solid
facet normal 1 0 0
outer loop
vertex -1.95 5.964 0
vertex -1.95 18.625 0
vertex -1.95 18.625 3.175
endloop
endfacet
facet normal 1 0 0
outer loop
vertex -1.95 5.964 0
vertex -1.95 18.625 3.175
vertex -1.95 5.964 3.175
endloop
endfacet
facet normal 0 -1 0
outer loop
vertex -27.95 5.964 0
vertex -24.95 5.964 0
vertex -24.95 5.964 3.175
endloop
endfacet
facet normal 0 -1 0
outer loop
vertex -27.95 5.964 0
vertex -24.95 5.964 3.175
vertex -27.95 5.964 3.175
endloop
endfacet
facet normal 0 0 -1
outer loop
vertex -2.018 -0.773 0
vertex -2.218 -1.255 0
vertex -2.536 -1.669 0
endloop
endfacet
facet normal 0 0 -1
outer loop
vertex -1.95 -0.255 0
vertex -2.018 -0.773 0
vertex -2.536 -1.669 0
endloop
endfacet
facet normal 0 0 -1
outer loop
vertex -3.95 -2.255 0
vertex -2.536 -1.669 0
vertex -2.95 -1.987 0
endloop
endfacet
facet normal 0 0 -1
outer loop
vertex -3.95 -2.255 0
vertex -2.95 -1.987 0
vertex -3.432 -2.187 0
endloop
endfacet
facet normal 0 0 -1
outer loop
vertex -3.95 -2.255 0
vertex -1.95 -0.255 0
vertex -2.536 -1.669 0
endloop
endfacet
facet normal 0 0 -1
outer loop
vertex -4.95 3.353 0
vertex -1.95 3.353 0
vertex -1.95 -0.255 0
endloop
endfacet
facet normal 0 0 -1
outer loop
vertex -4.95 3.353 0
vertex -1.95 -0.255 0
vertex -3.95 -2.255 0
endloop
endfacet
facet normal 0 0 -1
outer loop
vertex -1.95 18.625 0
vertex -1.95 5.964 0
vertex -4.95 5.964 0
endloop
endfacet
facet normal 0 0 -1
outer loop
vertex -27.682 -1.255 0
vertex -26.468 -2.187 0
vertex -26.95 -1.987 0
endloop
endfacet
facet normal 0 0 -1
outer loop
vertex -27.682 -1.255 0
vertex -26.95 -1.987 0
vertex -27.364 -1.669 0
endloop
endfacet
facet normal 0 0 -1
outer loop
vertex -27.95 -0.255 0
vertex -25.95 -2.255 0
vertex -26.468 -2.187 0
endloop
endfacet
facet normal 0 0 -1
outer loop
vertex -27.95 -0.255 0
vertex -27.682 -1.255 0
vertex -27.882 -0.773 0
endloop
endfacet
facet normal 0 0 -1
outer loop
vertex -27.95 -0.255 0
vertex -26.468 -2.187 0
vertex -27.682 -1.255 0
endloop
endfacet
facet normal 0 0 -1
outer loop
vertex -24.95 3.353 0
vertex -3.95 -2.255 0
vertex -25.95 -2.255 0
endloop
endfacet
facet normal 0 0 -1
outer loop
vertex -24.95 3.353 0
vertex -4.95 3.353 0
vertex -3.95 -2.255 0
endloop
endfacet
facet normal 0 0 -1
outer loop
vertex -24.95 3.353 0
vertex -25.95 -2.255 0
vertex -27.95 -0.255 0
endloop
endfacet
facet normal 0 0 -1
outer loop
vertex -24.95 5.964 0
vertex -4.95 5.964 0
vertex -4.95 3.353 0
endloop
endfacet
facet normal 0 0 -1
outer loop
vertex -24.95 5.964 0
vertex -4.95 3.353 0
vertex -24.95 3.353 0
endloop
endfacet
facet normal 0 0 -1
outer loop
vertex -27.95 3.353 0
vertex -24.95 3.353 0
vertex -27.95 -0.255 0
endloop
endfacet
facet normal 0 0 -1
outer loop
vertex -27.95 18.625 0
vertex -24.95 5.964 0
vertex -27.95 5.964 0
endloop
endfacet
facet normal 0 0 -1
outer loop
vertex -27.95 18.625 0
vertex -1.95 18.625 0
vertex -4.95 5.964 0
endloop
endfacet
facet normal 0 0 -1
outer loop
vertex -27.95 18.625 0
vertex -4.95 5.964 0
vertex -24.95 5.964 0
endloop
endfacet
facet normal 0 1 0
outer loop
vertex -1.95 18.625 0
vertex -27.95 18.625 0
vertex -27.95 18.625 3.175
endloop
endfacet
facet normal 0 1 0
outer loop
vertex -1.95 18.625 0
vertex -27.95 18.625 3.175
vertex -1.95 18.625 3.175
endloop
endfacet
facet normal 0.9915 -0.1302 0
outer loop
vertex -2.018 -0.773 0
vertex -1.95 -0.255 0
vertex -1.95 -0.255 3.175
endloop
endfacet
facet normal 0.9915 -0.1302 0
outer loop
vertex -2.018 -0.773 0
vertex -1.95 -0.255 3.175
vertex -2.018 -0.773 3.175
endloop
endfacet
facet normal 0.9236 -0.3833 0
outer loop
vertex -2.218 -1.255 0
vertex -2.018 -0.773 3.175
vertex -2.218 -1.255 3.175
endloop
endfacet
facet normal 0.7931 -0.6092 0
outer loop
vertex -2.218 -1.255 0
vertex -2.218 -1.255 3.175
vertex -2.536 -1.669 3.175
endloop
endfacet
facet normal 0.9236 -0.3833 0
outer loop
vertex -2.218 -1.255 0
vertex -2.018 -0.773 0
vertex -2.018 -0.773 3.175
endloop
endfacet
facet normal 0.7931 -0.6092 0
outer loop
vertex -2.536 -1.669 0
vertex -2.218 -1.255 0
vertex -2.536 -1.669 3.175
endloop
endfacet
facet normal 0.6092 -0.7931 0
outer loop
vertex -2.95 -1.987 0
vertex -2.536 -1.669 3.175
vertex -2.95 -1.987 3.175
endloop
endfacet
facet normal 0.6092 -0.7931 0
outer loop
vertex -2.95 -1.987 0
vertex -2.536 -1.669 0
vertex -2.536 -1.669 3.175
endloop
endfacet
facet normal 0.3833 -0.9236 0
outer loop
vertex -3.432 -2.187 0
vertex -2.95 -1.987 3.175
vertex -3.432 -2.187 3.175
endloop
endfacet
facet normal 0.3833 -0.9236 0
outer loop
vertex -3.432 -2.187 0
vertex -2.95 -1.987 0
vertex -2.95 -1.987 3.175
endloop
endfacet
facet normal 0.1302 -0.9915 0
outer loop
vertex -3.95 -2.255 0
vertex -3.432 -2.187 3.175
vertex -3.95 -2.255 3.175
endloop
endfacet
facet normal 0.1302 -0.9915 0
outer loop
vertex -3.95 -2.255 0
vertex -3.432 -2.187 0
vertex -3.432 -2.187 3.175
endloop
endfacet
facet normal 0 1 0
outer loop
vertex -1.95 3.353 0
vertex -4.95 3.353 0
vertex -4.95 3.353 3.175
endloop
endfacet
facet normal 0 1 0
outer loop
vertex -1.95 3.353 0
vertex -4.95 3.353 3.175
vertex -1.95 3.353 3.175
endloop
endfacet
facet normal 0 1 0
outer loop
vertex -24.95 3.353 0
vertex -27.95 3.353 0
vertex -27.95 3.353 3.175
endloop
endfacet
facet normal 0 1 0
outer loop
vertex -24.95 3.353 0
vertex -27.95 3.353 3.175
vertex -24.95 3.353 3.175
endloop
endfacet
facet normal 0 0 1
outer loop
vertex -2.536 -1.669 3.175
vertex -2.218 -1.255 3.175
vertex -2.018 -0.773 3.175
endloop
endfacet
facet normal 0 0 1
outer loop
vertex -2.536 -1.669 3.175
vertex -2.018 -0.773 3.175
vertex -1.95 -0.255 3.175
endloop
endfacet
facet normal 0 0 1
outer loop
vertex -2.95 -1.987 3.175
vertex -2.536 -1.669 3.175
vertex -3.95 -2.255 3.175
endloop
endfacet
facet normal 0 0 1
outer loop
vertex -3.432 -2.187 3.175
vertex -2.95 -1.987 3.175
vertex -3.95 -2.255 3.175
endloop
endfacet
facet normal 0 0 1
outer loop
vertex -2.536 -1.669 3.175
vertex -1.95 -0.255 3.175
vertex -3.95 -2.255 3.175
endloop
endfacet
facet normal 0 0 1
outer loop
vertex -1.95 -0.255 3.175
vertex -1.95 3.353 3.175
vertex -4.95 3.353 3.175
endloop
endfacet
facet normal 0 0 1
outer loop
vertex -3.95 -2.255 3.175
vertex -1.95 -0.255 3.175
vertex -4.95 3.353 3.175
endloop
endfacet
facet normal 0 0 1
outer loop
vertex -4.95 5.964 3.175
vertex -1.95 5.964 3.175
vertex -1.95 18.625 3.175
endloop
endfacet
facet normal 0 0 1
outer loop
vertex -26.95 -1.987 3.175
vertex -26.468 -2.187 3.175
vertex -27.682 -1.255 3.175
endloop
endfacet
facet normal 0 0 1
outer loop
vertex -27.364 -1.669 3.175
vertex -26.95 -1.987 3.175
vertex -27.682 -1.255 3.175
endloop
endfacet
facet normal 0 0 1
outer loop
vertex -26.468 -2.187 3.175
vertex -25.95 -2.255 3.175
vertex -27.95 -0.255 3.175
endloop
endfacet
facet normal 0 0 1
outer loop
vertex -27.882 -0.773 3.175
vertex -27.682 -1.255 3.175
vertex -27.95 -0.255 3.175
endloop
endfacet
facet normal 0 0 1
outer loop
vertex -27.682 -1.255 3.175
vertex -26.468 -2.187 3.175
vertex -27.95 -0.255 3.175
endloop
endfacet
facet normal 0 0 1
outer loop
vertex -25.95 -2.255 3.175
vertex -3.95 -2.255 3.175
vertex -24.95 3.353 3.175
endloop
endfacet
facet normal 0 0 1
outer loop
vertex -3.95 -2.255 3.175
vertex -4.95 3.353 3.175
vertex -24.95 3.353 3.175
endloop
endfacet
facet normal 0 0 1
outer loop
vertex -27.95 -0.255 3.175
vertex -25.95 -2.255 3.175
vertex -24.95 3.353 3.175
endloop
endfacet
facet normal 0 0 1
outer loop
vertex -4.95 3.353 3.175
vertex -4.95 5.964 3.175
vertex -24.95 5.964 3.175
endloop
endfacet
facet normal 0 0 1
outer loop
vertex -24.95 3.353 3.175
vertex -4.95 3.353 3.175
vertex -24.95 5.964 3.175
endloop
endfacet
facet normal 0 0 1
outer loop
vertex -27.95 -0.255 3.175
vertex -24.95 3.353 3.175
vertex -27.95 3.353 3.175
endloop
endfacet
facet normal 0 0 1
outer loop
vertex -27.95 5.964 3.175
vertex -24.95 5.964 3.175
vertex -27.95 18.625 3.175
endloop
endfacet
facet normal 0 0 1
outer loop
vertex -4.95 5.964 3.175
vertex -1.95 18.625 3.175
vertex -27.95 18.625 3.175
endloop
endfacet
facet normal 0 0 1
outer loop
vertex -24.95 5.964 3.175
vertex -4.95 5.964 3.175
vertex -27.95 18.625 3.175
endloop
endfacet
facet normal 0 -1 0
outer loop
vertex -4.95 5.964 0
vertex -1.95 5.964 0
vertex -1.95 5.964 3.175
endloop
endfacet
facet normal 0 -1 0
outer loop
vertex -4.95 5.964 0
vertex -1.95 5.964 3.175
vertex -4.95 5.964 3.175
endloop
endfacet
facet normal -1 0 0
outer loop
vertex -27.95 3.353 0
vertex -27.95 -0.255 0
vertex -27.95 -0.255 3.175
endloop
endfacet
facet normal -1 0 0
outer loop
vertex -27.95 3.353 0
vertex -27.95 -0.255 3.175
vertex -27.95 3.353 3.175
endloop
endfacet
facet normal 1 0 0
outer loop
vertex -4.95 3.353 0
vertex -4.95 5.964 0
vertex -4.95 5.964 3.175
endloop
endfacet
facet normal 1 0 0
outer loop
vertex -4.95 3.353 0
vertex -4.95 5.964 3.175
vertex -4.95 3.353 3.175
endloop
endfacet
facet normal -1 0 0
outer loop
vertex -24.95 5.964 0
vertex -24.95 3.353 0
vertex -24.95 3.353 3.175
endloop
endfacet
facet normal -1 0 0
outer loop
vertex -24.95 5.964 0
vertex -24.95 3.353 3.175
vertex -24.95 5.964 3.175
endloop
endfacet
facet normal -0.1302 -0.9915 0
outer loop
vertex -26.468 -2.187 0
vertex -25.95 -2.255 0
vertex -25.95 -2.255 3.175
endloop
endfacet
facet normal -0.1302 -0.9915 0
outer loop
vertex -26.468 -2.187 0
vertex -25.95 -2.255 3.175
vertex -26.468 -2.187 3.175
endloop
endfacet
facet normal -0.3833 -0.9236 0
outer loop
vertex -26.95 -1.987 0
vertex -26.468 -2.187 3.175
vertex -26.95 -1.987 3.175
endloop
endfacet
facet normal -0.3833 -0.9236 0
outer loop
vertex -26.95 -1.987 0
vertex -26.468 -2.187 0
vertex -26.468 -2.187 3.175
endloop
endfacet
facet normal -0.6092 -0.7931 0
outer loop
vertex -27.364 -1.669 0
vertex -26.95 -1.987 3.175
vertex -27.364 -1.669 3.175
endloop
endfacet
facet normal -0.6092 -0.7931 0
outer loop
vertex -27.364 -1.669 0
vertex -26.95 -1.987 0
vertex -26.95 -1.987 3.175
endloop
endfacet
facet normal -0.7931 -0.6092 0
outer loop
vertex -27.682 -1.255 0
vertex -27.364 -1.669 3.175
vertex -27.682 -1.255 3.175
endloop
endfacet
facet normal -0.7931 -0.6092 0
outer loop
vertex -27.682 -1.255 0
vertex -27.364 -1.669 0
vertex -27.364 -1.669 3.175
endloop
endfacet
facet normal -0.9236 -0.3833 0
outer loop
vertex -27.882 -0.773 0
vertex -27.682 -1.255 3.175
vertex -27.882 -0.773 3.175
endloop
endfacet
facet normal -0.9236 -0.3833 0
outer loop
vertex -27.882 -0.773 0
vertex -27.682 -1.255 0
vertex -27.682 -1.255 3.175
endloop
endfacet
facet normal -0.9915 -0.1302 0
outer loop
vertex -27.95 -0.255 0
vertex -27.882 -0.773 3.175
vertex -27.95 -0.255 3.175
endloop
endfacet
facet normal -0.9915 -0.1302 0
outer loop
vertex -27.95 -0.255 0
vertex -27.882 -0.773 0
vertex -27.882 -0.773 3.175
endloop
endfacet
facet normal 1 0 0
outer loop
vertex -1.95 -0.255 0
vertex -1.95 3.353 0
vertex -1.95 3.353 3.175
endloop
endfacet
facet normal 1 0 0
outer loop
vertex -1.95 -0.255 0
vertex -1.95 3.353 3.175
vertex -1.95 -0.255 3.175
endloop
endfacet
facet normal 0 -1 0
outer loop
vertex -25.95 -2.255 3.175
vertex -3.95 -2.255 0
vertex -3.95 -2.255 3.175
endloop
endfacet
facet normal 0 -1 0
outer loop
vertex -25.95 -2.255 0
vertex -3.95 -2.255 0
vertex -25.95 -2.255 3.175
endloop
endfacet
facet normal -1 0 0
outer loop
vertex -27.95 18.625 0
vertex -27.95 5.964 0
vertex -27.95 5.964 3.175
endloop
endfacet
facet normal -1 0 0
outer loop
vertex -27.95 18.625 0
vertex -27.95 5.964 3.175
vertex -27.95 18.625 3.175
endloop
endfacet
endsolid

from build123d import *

# Parameters (mm, degrees)
BOSS_EXTRUDE1_DEPTH = 3.175


with BuildPart() as part:
    # Sketch1 → Boss-Extrude1 (new body)
    with BuildSketch(Plane.XY):
        with BuildLine():
            Line((-27.95, 18.625), (-1.95, 18.625))
            Line((-1.95, 18.625), (-1.95, 5.963704675))
            Line((-1.95, 5.963704675), (-4.95, 5.963704675))
            Line((-4.95, 5.963704675), (-4.95, 3.353294588))
            Line((-4.95, 3.353294588), (-1.95, 3.353294588))
            Line((-1.95, 3.353294588), (-1.95, 2.795))
            Line((-1.95, 2.795), (-1.95, -0.255))
            ThreePointArc((-1.95, -0.255), (-2.535786438, -1.669213562), (-3.95, -2.255))
            Line((-3.95, -2.255), (-25.95, -2.255))
            ThreePointArc((-25.95, -2.255), (-27.364213562, -1.669213562), (-27.95, -0.255))
            Line((-27.95, -0.255), (-27.95, 2.795))
            Line((-27.95, 2.795), (-27.95, 3.353294588))
            Line((-27.95, 3.353294588), (-24.95, 3.353294588))
            Line((-24.95, 3.353294588), (-24.95, 5.963704675))
            Line((-24.95, 5.963704675), (-27.95, 5.963704675))
            Line((-27.95, 5.963704675), (-27.95, 18.625))
        make_face()
    extrude(amount=BOSS_EXTRUDE1_DEPTH)


solid = part.part
